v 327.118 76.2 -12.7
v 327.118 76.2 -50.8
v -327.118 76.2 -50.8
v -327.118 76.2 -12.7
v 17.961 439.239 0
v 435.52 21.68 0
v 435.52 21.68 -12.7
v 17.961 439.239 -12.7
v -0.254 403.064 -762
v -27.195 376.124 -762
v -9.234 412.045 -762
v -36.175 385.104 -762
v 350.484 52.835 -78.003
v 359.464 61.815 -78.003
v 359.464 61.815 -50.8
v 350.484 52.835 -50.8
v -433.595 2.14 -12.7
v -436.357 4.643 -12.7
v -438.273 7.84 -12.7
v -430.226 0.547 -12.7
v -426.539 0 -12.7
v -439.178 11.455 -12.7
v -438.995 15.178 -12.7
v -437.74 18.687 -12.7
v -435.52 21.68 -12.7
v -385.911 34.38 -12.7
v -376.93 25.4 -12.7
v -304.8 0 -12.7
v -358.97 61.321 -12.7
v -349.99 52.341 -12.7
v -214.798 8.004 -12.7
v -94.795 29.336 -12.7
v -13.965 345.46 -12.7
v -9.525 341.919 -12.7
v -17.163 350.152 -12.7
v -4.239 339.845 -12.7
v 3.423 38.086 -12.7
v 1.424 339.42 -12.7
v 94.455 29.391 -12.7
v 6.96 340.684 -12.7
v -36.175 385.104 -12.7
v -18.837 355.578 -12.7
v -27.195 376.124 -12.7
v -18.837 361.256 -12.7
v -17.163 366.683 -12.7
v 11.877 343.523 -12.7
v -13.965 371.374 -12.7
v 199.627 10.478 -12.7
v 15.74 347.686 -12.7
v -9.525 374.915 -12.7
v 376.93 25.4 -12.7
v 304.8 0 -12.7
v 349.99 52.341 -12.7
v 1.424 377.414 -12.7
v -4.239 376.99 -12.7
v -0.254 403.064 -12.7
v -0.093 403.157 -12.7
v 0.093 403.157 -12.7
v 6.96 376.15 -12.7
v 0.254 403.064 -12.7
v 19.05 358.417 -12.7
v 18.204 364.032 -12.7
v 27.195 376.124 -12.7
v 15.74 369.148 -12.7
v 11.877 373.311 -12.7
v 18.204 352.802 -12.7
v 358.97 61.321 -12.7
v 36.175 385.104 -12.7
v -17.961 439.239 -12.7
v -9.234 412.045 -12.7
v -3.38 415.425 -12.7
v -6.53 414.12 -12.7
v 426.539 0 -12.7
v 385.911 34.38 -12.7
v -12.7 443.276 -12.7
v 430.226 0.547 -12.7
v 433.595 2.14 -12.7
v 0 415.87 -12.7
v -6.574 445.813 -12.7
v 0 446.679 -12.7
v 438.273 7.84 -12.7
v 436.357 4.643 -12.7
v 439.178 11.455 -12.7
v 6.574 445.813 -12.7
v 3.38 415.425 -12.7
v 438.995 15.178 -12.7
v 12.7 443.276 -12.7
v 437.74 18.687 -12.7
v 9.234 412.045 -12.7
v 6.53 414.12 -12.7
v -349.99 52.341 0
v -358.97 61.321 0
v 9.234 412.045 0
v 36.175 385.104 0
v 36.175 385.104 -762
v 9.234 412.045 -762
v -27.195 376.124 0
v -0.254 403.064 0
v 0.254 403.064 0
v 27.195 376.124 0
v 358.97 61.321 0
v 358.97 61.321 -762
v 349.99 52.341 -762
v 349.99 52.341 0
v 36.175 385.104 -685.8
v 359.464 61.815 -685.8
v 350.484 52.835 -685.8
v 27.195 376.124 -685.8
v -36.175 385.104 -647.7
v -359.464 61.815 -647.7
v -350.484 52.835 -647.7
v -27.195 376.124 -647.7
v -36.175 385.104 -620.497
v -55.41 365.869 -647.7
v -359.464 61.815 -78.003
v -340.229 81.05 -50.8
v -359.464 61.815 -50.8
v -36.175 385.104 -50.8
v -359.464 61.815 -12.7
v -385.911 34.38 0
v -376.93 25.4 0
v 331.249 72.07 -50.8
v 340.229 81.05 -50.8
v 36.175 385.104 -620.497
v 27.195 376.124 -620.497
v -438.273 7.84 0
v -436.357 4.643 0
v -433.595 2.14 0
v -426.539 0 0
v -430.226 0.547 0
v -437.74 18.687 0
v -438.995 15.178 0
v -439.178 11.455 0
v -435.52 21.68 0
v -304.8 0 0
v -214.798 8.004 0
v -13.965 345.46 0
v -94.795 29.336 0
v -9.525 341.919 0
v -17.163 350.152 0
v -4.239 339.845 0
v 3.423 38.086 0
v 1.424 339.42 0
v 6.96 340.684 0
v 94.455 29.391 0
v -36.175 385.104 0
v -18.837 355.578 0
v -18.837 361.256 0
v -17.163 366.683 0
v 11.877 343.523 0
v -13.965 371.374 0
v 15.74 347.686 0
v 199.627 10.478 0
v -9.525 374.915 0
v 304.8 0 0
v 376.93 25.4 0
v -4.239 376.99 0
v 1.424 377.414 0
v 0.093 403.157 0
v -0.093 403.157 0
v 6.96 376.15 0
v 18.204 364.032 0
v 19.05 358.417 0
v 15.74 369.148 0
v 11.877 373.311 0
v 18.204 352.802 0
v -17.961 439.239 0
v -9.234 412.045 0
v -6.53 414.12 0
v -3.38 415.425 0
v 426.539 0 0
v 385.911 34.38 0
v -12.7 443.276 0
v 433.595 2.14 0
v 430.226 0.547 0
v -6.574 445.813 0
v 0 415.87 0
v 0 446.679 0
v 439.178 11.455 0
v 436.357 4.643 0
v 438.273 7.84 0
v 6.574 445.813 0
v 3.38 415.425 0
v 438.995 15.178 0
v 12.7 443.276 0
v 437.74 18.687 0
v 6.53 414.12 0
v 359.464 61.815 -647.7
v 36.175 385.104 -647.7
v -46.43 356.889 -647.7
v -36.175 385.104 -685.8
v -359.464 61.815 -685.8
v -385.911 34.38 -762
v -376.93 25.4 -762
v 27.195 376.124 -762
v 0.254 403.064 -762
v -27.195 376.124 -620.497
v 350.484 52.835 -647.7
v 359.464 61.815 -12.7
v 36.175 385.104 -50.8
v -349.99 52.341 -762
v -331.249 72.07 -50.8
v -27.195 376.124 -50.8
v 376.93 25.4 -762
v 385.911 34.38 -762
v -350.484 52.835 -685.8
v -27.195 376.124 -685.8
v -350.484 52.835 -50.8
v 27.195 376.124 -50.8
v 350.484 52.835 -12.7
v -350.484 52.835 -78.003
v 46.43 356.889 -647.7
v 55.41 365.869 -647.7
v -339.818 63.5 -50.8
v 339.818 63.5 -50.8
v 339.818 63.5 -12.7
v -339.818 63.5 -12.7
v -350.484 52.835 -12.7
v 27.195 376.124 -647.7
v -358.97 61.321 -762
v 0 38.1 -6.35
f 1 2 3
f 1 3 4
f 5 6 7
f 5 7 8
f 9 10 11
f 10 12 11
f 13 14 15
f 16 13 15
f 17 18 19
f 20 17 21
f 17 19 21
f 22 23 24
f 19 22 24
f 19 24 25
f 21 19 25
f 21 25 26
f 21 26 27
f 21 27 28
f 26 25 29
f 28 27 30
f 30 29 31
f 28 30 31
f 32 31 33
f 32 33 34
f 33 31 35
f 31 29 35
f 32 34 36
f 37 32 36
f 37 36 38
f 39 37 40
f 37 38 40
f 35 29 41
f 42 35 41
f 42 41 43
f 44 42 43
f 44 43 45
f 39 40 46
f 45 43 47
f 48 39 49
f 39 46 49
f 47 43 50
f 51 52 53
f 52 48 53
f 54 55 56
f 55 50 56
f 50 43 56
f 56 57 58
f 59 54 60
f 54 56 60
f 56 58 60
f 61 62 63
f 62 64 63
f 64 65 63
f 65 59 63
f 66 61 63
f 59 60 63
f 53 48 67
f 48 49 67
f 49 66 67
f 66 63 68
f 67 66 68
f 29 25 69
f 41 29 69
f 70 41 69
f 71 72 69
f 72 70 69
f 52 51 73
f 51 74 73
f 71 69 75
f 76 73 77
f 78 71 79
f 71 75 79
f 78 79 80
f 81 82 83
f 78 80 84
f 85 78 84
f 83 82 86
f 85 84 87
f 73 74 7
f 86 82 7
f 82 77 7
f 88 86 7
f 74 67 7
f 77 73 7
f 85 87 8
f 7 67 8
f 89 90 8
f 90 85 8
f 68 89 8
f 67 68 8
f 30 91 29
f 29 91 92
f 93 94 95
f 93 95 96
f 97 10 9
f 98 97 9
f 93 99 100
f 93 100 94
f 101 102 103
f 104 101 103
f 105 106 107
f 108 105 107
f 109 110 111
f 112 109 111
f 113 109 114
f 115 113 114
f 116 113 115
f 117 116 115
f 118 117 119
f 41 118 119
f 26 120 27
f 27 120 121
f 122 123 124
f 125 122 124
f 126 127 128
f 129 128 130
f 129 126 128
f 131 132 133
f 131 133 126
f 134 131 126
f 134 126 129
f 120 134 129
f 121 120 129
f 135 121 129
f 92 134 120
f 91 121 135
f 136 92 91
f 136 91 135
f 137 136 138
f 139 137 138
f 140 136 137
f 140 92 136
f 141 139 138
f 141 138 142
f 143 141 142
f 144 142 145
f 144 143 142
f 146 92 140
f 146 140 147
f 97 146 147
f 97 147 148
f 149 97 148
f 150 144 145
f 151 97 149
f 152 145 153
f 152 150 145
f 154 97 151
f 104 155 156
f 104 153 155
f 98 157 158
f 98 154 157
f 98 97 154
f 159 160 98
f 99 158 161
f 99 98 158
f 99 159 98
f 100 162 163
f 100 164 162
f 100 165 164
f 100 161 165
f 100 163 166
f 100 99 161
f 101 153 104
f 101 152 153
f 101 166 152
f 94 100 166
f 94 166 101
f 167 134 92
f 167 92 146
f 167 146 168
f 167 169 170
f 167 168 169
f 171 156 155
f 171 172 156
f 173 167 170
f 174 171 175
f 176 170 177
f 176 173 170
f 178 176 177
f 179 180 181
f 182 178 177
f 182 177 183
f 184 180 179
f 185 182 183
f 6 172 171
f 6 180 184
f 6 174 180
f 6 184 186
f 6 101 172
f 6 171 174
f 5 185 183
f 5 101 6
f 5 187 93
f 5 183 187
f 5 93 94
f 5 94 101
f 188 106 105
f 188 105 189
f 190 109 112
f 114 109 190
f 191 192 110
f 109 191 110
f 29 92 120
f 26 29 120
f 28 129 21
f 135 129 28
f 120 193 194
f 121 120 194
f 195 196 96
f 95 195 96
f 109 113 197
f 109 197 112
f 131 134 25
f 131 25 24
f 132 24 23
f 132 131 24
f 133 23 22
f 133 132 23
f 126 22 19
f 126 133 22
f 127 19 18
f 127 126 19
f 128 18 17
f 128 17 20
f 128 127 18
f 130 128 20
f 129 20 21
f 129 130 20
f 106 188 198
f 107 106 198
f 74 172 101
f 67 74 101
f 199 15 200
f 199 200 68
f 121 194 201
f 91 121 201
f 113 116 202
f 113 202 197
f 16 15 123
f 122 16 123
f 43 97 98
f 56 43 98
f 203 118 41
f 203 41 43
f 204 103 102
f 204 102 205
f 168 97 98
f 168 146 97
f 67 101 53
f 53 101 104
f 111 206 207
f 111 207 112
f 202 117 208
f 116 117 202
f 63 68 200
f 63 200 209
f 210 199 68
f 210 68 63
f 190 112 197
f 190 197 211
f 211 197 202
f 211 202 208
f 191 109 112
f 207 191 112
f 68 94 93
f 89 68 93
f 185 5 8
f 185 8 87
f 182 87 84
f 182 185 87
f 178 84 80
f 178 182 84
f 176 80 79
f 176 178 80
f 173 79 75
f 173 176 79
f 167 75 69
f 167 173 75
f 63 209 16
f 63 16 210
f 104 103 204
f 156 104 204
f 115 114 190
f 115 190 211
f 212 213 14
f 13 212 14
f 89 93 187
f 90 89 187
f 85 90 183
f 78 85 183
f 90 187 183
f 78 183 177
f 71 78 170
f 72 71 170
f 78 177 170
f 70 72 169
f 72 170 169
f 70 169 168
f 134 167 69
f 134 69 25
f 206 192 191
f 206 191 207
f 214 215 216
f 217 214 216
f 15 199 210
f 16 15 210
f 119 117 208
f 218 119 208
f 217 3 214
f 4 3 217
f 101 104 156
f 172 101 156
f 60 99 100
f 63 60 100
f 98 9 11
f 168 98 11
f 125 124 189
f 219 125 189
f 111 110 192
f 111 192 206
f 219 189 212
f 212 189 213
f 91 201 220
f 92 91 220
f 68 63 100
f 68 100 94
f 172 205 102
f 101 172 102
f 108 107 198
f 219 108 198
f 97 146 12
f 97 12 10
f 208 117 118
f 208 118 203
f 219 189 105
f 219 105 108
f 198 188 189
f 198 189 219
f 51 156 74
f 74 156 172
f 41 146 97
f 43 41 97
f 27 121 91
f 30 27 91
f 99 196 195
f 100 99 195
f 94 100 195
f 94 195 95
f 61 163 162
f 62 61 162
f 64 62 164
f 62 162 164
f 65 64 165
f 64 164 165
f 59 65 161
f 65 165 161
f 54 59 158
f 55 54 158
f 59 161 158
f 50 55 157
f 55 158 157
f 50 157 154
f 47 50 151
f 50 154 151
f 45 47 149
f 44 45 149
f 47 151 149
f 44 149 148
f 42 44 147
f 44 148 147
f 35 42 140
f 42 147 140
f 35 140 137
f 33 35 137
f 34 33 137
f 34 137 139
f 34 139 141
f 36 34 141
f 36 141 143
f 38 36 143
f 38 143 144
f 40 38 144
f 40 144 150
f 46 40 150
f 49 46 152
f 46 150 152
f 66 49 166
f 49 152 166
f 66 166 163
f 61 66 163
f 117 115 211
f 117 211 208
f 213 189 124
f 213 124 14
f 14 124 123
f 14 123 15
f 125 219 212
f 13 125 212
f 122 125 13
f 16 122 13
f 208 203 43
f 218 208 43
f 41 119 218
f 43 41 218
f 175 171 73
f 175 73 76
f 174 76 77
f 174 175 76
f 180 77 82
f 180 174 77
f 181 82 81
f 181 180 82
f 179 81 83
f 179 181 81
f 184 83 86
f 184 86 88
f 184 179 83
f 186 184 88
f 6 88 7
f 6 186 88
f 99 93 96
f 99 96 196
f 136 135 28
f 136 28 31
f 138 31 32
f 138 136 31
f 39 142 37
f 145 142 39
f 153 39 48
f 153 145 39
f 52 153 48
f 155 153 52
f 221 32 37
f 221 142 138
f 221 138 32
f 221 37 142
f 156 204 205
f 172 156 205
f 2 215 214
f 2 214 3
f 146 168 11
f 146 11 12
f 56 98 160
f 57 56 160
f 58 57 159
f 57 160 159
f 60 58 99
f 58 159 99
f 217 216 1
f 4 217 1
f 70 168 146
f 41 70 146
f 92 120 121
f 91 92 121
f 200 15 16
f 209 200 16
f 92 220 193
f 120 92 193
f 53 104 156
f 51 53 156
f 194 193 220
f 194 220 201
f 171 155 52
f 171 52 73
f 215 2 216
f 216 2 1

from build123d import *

# Parameters (mm, degrees)
F3_DEPTH  = 12.7
F2_R      = 19.05
F4_DEPTH  = 12.7
F5_DEPTH  = 762
F6_W      = 12.7
F6_H      = 38.1
F7_DEPTH  = 457.1994660567
F9_DEPTH  = 12.7
F11_W     = 12.7
F11_H     = 38.1
F12_REACH = 479.401414142
F13_REACH = 479.401414142


with BuildPart() as f3:
    # F1 (on Top) → F3 (new body)
    with BuildSketch(Plane.XY):
        with BuildLine():
            Line((435.5197438789, 21.6802561211), (17.9605122421, 439.2394877579))
            ThreePointArc((17.9605122421, 439.2394877579), (0, 446.6789755157), (-17.9605122421, 439.2394877579))
            Line((-17.9605122421, 439.2394877579), (-435.5197438789, 21.6802561211))
            ThreePointArc((-435.5197438789, 21.6802561211), (-438.2727578208, 7.839920409), (-426.5394877579, 0))
            Line((-426.5394877579, 0), (-304.8, 0))
            add(Edge.make_bspline(
                [(-304.8, 0), (-203.2, 0), (0, 76.2), (203.2, 0), (304.8, 0)],
                knots=[0, 0, 0, 0, 0.5, 1, 1, 1, 1], degree=3))
            Line((304.8, 0), (426.5394877579, 0))
            ThreePointArc((426.5394877579, 0), (438.2727578208, 7.839920409), (435.5197438789, 21.6802561211))
        make_face()
    extrude(amount=-F3_DEPTH)

    # F2 (on Top) → F4 (cut, through all)
    with BuildSketch(Plane.XY):
        Polygon((-27.1947683632, 376.1236949104), (-0.254, 403.0644632736), (-9.2342561211, 412.0447193947), (-36.1750244843, 385.1039510314), align=None)
        with BuildLine():
            Line((-9.2342561211, 412.0447193947), (-0.254, 403.0644632736))
            ThreePointArc((-0.254, 403.0644632736), (0, 403.1696735184), (0.254, 403.0644632736))
            Line((0.254, 403.0644632736), (9.2342561211, 412.0447193947))
            ThreePointArc((9.2342561211, 412.0447193947), (0, 415.8696735184), (-9.2342561211, 412.0447193947))
        make_face()
        Polygon((9.2342561211, 412.0447193947), (0.254, 403.0644632736), (27.1947683632, 376.1236949104), (36.1750244843, 385.1039510314), align=None)
        Polygon((-358.9697835442, 61.3210244843), (-385.9105519074, 34.3802561211), (-376.9302957863, 25.4), (-349.9895274231, 52.3407683632), align=None)
        Polygon((358.9697835442, 61.3210244843), (349.9895274231, 52.3407683632), (376.9302957863, 25.4), (385.9105519074, 34.3802561211), align=None)
        with Locations((0, 358.4171826682)):
            Circle(F2_R)
    extrude(amount=-F4_DEPTH, mode=Mode.SUBTRACT)


with BuildPart() as f5:
    # F2 (on Top) → F5 (new body)
    with BuildSketch(Plane.XY):
        Polygon((-358.9697835442, 61.3210244843), (-385.9105519074, 34.3802561211), (-376.9302957863, 25.4), (-349.9895274231, 52.3407683632), align=None)
    extrude(amount=-F5_DEPTH)


with BuildPart() as f5b:
    # F2 (on Top) → F5, piece 2 (new body)
    with BuildSketch(Plane.XY):
        Polygon((358.9697835442, 61.3210244843), (349.9895274231, 52.3407683632), (376.9302957863, 25.4), (385.9105519074, 34.3802561211), align=None)
    extrude(amount=-F5_DEPTH)


with BuildPart() as f5c:
    # F2 (on Top) → F5, piece 3 (new body)
    with BuildSketch(Plane.XY):
        Polygon((9.2342561211, 412.0447193947), (0.254, 403.0644632736), (27.1947683632, 376.1236949104), (36.1750244843, 385.1039510314), align=None)
    extrude(amount=-F5_DEPTH)


with BuildPart() as f5d:
    # F2 (on Top) → F5, piece 4 (new body)
    with BuildSketch(Plane.XY):
        Polygon((-27.1947683632, 376.1236949104), (-0.254, 403.0644632736), (-9.2342561211, 412.0447193947), (-36.1750244843, 385.1039510314), align=None)
    extrude(amount=-F5_DEPTH)


with BuildPart() as f7:
    # F6 (on face) → F7 (new body, through all)
    with BuildSketch(Plane(origin=(174.4644632736, 174.4644632736, 0), x_dir=(0.7071067812, -0.7071067812, 0), z_dir=(-0.7071067812, -0.7071067812, 0))):
        with Locations((-291.5392203585, -31.75)):
            Rectangle(F6_W, F6_H)
    extrude(amount=F7_DEPTH)


with BuildPart() as f7b:
    # F6 (on face) → F7, piece 2 (new body, through all)
    with BuildSketch(Plane(origin=(174.4644632736, 174.4644632736, 0), x_dir=(0.7071067812, -0.7071067812, 0), z_dir=(-0.7071067812, -0.7071067812, 0))):
        with Locations((-291.5392203585, -666.75)):
            Rectangle(F6_W, F6_H)
    extrude(amount=F7_DEPTH)


with BuildPart() as f9:
    # F8 (on face) → F9 (new body)
    with BuildSketch(Plane(origin=(-210.6394877579, 210.6394877579, 0), x_dir=(-0.7071067812, -0.7071067812, 0), z_dir=(-0.7071067812, 0.7071067812, 0))):
        Polygon((210.469455943, -78.0025485289), (210.469455943, -50.8), (183.2669074141, -50.8), (-246.7300101136, -620.4974514711), (-246.7300101136, -647.7), (-219.5274615847, -647.7), align=None)
    extrude(amount=-F9_DEPTH)


with BuildPart() as f10_1:
    # F10: instance of F7b
    add(f7b.part.mirror(Plane.YZ))


with BuildPart() as f10_2:
    # F10: instance of F7
    add(f7.part.mirror(Plane.YZ))


with BuildPart() as f10_3:
    # F10: instance of F9
    add(f9.part.mirror(Plane.YZ))


with BuildPart() as f12:
    f12_end = f7.part.faces().sort_by_distance((-188.839189765, 214.4792735086, -31.75))[0]
    # F11 (on Right) → F12 (new body, up to a face of F7 that its end follows)
    with BuildSketch(Plane.YZ):
        with Locations((69.85, -31.75)):
            Rectangle(F11_W, F11_H)
    f12_long = extrude(amount=-F12_REACH, mode=Mode.PRIVATE)
    add(split(f12_long, bisect_by=f12_end, keep=Keep.TOP, mode=Mode.PRIVATE))

    f13_end = f10_2.part.faces().sort_by_distance((188.839189765, 214.4792735086, -31.75))[0]
    # F11 (on Right) → F13 (join, up to a face of F10_2 that its end follows)
    with BuildSketch(Plane.YZ):
        with Locations((69.85, -31.75)):
            Rectangle(F11_W, F11_H)
    f13_long = extrude(amount=F13_REACH, mode=Mode.PRIVATE)
    add(split(f13_long, bisect_by=f13_end, keep=Keep.TOP, mode=Mode.PRIVATE))


solid = Compound([f3.part, f5.part, f5b.part, f5c.part, f5d.part, f7.part, f7b.part, f9.part, f10_1.part, f10_2.part, f10_3.part, f12.part])
